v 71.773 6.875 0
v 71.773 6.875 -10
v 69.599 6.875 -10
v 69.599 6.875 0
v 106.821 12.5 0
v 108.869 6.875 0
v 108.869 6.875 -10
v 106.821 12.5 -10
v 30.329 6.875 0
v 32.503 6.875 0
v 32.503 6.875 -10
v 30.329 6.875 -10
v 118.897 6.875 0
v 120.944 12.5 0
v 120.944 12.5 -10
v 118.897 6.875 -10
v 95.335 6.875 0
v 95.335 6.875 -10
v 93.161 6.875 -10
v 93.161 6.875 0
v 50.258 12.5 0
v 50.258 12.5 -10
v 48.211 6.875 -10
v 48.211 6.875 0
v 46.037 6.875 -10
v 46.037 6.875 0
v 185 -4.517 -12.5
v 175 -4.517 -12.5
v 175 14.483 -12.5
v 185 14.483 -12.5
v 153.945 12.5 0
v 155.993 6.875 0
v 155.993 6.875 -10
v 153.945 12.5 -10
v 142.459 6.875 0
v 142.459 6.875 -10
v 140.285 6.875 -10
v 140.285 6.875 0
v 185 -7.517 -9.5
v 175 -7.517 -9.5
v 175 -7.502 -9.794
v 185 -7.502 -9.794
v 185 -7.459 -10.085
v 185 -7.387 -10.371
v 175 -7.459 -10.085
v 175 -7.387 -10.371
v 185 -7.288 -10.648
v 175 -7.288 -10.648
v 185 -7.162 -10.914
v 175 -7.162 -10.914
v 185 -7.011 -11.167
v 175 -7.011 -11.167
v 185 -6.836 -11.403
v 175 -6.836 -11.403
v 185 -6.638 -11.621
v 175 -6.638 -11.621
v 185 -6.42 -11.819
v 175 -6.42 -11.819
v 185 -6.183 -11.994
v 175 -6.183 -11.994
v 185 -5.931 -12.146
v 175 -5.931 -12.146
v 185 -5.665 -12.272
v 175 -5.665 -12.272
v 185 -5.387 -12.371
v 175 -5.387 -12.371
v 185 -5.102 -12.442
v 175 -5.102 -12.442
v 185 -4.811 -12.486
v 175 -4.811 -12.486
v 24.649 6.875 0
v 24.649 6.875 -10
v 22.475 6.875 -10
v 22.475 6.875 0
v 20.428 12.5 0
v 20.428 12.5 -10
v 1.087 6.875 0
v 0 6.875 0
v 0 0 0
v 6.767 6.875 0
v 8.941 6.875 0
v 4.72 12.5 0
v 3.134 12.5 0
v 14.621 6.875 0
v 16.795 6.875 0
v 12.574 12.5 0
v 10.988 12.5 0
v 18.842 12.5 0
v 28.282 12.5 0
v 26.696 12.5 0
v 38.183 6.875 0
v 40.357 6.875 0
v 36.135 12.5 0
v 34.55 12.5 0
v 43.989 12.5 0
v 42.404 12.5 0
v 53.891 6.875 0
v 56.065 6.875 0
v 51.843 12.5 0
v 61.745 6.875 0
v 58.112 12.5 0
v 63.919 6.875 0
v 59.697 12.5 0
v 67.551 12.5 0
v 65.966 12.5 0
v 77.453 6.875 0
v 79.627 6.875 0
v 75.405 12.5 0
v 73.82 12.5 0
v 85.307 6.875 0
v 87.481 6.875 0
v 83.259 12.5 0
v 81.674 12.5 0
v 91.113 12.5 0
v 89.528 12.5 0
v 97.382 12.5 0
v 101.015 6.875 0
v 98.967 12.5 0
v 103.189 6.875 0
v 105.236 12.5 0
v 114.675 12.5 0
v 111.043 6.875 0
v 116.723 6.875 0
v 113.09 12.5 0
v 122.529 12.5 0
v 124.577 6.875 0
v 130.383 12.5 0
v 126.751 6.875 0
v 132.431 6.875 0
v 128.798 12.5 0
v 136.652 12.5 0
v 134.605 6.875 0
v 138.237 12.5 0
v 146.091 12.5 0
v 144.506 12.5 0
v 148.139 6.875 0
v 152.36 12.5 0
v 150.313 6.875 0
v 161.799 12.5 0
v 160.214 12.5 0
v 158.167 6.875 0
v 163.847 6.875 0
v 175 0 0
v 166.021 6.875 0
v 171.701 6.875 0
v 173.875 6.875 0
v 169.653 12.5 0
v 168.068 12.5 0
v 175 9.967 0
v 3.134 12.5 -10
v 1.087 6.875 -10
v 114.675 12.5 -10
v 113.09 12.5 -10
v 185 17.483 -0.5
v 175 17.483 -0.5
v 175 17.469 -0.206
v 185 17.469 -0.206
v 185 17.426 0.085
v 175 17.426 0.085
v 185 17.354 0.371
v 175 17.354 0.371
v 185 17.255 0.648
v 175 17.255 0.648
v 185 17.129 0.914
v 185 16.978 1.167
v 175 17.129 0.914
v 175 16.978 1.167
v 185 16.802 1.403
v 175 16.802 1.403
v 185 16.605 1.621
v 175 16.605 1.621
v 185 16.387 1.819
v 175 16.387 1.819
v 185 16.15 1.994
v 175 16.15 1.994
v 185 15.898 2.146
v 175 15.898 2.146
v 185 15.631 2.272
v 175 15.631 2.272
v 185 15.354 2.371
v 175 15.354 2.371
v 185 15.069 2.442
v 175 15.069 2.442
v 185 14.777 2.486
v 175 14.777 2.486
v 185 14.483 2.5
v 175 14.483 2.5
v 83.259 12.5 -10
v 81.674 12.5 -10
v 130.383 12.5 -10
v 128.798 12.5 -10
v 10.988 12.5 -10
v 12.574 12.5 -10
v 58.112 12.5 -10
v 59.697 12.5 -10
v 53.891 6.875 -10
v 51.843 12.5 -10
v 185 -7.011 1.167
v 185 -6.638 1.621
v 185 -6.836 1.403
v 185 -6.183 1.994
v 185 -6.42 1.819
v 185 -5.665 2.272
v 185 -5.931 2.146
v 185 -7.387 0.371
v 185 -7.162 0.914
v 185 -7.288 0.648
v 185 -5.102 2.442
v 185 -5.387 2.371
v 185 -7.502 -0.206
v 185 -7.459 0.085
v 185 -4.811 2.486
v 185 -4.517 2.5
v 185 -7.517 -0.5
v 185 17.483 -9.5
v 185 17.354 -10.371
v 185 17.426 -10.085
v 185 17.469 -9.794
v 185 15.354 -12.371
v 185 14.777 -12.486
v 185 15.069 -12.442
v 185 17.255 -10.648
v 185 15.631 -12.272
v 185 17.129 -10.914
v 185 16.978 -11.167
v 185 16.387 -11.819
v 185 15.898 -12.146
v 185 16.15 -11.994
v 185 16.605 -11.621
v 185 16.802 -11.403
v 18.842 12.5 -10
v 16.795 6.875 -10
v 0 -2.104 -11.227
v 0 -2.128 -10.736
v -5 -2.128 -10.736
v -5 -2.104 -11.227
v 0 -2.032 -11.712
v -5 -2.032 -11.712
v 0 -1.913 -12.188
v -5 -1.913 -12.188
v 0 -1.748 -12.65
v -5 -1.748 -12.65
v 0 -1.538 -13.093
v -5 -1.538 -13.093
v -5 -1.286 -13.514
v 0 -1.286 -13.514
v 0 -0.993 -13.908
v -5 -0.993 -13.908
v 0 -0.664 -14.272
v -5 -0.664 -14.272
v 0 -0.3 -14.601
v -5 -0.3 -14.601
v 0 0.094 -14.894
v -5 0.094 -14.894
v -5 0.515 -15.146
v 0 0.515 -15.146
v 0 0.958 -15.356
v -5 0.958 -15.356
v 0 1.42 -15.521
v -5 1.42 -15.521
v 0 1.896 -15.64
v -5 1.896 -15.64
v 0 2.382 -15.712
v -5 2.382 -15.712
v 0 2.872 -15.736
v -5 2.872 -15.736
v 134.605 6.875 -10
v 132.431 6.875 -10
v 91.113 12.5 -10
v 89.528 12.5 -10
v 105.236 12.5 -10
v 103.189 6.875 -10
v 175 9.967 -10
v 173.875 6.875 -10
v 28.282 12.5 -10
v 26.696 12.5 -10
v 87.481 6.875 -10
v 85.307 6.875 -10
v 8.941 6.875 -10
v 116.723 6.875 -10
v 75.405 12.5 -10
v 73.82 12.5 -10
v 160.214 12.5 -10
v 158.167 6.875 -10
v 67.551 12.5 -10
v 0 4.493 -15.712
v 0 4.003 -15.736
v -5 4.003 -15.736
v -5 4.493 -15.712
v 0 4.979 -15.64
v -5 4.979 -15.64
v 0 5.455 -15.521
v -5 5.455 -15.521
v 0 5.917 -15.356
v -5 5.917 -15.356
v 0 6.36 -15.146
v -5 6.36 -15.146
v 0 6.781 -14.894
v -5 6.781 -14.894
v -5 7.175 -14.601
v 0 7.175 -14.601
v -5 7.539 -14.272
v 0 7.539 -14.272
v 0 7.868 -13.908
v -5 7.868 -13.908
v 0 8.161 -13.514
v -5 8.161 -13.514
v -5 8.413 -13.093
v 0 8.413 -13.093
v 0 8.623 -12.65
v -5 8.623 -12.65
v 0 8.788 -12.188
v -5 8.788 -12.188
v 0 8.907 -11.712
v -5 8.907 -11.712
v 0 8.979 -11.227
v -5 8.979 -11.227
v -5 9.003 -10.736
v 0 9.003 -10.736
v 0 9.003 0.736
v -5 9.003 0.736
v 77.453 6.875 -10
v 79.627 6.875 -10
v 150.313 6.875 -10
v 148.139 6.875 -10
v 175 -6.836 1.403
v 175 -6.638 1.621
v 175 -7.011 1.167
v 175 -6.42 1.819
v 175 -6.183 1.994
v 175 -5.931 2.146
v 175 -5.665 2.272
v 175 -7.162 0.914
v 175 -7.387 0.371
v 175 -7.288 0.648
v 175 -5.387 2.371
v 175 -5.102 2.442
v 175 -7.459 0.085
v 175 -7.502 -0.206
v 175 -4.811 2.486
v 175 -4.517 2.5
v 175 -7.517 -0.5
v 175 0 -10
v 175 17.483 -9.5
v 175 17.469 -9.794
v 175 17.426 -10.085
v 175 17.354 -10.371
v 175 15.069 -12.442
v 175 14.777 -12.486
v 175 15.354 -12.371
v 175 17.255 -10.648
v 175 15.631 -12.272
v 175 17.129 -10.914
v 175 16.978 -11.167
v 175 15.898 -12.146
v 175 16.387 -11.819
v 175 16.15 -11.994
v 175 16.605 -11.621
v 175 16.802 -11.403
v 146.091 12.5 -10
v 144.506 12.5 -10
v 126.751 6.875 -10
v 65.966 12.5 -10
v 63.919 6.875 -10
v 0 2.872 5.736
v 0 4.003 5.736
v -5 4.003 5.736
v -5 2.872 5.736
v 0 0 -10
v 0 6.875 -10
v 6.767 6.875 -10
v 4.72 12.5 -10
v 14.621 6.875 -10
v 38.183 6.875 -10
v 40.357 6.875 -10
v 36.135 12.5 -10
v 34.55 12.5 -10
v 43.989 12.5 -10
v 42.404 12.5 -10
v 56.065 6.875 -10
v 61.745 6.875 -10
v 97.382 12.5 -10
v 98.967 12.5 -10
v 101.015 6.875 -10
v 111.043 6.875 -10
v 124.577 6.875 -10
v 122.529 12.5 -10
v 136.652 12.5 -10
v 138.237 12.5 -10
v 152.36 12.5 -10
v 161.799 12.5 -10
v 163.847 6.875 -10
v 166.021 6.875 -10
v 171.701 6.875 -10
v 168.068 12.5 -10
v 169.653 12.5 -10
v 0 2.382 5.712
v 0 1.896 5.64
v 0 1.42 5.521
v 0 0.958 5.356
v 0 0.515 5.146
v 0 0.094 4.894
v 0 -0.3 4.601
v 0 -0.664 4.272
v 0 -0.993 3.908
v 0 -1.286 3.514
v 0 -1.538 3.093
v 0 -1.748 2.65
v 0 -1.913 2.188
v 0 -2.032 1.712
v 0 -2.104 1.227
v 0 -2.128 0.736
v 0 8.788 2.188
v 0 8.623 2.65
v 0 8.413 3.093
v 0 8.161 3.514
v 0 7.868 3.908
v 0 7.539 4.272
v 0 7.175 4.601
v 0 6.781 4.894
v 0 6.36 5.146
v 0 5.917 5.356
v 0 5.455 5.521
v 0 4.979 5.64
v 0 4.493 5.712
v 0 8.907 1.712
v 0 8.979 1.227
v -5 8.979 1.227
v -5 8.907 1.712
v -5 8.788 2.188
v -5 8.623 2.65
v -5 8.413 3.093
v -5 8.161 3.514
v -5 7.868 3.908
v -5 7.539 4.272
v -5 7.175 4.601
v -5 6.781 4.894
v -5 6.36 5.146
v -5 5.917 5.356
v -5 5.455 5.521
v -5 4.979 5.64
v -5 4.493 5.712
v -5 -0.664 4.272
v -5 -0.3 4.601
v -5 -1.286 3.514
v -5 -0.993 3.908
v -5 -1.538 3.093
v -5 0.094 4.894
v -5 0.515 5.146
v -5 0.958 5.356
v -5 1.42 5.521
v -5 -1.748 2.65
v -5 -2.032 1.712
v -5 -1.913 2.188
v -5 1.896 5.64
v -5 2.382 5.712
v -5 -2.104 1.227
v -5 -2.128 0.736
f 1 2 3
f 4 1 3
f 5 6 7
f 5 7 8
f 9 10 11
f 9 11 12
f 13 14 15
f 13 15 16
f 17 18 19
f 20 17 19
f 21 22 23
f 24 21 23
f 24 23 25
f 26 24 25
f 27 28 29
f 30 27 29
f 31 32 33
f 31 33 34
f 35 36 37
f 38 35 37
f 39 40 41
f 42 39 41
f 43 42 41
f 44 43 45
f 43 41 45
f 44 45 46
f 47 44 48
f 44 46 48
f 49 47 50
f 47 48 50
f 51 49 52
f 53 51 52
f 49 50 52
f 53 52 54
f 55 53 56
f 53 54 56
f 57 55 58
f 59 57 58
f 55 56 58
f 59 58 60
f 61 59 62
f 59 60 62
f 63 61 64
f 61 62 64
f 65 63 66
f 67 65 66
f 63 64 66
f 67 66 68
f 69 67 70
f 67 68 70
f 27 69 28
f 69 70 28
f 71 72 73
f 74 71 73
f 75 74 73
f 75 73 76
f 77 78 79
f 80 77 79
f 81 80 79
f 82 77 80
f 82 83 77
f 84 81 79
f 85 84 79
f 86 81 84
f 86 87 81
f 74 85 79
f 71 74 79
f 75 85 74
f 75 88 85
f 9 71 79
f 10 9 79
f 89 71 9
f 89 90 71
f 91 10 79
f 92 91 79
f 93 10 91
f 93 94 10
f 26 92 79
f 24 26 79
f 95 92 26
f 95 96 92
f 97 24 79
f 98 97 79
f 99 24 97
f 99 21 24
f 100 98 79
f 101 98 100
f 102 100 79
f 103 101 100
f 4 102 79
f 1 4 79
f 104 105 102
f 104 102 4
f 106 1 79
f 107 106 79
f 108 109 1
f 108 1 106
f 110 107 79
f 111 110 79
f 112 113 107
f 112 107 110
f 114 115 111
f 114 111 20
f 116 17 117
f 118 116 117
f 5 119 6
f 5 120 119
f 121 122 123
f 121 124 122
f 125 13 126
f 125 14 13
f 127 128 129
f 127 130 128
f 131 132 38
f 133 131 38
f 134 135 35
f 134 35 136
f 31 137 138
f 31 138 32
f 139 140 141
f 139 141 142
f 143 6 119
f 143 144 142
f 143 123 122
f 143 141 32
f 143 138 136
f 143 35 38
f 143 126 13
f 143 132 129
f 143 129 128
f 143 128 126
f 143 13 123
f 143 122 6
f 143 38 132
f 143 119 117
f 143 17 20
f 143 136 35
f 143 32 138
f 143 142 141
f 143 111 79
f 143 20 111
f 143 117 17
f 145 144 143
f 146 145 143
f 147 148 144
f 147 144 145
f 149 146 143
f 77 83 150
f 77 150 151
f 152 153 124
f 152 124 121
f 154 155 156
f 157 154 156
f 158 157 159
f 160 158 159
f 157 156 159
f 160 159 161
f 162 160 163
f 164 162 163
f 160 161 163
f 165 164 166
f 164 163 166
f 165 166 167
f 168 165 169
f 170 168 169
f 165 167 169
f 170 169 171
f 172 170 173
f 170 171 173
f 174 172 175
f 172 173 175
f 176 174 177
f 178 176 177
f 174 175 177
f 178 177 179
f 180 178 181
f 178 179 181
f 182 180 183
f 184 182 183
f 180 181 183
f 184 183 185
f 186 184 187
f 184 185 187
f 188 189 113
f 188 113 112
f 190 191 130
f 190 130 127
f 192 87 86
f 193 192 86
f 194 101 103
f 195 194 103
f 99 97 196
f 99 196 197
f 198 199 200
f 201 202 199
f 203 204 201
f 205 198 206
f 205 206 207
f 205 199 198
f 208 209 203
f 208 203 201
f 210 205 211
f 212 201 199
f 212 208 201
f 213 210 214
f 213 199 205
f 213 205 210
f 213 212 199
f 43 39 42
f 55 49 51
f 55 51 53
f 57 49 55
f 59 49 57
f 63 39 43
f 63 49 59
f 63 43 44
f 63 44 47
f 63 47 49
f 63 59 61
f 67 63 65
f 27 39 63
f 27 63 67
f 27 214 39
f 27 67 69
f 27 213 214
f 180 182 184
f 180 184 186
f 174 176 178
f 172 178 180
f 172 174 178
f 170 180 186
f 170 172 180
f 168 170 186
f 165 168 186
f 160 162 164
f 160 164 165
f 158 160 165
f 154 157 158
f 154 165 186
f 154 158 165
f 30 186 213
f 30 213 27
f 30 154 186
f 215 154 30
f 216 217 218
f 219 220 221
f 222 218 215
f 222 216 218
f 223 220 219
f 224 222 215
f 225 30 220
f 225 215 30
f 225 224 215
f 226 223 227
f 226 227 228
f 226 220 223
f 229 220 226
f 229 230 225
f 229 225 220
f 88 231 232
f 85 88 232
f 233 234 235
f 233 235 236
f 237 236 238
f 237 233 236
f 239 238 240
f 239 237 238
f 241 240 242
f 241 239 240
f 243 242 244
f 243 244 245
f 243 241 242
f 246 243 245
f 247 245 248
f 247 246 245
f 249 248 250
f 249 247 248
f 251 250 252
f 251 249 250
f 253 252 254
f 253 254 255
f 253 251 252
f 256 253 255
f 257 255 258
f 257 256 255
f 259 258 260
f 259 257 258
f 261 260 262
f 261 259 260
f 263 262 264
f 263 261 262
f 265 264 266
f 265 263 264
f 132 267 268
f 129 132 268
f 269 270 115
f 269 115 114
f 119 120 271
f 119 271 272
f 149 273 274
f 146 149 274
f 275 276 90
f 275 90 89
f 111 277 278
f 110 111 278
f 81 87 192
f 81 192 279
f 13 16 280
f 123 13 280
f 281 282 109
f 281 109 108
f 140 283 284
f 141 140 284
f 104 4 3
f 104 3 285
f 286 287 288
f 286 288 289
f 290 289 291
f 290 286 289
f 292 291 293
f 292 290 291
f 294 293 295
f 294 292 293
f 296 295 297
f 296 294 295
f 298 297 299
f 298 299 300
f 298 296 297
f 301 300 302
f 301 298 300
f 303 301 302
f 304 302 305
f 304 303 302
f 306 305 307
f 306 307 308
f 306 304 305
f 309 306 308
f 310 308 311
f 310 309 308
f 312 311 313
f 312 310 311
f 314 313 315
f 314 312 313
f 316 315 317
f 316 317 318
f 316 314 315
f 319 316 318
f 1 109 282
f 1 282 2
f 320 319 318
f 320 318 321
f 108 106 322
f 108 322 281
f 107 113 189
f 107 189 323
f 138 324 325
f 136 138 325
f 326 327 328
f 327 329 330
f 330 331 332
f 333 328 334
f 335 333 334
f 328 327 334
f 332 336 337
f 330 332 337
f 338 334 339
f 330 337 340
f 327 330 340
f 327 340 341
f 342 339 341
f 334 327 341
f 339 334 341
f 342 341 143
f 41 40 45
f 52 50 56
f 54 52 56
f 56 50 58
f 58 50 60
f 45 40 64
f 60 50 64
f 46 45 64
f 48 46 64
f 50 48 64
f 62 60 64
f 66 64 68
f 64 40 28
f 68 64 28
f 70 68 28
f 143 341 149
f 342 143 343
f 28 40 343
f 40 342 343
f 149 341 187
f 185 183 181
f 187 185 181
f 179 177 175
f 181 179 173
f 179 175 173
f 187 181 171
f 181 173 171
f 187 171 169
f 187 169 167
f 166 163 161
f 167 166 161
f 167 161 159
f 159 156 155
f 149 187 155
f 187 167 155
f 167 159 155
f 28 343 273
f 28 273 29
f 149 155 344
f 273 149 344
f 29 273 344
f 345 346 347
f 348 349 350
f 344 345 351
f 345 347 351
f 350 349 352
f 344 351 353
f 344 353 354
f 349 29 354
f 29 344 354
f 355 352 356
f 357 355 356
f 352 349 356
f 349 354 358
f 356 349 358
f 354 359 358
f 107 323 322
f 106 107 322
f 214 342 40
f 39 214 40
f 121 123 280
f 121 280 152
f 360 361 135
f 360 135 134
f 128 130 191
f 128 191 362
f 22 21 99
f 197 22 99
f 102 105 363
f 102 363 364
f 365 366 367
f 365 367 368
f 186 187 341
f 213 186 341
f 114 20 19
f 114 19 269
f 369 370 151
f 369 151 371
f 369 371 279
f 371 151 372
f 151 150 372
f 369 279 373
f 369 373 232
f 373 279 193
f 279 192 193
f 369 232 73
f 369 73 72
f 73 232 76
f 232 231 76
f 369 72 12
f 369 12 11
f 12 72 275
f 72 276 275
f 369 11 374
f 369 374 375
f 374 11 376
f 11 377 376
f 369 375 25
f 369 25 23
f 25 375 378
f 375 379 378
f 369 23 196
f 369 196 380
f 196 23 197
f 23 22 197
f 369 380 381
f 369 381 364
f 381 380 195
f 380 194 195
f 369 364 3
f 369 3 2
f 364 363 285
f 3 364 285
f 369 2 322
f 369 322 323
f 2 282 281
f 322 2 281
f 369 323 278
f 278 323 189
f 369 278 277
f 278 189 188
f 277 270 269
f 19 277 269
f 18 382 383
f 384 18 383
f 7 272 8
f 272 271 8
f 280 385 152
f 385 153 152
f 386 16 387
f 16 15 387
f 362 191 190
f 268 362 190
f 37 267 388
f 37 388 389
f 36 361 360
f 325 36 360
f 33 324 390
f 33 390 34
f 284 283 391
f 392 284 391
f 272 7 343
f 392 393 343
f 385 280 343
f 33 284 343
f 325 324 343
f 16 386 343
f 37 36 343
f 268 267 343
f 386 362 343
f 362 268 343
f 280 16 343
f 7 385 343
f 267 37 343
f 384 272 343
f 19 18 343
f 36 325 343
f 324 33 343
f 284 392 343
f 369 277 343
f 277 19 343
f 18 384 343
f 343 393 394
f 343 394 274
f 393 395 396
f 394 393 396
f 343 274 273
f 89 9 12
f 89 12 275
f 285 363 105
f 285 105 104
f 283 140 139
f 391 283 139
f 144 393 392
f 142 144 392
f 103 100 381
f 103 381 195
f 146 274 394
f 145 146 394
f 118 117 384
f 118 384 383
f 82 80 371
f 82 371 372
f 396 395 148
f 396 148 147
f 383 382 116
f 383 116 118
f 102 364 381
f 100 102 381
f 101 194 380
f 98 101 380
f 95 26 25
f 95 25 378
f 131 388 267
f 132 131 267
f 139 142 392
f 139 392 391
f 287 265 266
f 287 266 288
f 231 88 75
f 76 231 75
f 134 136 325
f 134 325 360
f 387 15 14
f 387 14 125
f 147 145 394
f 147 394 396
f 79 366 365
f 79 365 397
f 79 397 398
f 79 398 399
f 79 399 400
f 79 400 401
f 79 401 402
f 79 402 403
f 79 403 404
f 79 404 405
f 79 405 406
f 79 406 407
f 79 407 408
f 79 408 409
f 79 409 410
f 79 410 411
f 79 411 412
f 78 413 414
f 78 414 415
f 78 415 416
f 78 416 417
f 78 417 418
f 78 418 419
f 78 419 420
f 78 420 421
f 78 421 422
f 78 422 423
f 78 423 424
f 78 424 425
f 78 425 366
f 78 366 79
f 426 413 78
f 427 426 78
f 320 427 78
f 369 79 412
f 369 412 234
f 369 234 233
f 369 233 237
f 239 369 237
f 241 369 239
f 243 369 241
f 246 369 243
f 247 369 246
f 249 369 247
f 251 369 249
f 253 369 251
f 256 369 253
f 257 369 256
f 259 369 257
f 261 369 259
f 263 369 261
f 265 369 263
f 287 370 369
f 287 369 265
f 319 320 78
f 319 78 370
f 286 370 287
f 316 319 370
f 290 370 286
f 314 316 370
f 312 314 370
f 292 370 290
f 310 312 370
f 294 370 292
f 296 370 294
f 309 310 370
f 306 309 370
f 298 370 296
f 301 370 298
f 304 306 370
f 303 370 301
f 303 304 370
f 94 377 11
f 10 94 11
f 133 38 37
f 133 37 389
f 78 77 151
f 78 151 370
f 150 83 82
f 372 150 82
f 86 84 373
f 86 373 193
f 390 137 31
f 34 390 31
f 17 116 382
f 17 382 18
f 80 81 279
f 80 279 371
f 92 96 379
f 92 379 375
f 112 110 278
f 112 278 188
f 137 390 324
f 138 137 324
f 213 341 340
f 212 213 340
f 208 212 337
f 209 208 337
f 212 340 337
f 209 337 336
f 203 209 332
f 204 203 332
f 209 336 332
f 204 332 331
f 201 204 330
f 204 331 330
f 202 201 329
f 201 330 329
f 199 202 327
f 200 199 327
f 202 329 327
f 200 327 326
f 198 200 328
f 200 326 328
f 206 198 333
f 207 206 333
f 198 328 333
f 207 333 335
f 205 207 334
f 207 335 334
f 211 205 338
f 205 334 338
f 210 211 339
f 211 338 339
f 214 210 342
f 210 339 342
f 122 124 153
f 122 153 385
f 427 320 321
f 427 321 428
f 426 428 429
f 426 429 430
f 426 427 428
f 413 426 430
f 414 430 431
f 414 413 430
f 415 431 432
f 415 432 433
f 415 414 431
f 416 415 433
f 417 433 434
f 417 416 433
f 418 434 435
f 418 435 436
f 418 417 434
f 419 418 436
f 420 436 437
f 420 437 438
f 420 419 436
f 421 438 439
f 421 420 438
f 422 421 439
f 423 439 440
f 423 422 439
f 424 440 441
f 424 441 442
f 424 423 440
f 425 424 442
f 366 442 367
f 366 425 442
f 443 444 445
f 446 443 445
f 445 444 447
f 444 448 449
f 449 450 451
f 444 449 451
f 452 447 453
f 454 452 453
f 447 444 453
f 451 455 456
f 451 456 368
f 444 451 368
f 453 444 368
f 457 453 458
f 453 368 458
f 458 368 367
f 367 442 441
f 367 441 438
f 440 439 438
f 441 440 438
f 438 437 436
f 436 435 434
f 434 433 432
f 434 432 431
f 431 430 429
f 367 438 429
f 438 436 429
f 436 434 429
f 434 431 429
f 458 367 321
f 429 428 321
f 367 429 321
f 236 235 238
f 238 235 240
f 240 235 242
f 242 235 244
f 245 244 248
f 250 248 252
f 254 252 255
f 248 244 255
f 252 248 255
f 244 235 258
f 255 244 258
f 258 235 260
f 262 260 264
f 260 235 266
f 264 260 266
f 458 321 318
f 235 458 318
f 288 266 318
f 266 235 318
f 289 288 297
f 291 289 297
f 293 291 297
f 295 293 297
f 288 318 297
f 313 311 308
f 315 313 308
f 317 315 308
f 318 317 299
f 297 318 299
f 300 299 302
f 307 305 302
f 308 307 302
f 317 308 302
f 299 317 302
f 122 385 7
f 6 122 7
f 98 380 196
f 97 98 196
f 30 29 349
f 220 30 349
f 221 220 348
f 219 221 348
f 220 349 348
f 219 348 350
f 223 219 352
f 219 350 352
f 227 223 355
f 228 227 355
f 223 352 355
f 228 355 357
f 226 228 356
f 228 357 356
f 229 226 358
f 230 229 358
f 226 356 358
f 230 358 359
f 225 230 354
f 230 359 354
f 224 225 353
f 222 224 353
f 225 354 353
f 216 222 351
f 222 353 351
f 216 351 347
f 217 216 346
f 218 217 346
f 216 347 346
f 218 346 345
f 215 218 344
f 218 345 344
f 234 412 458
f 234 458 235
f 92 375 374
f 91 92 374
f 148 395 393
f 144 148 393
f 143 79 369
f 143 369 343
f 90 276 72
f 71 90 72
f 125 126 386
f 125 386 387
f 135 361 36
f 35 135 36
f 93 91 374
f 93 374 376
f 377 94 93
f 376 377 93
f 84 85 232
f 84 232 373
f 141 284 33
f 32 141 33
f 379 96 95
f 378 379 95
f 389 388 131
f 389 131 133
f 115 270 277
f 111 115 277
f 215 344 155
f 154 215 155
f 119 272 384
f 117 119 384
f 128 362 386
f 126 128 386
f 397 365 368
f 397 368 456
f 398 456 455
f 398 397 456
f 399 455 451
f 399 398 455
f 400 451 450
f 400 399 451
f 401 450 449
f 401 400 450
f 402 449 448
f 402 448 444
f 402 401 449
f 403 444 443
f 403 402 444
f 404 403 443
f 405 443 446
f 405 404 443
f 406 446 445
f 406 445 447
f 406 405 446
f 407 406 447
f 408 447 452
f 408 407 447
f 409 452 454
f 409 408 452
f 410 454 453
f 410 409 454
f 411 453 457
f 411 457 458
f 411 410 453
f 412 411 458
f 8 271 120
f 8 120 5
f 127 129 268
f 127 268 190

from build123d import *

# Parameters (mm, degrees)
BLANKSKE_W         = 175
BLANKSKE_H         = 12.5
BLANK_DEPTH        = 10
TOOTHCUTSIM_DEPTH  = 176.730617708
TEETHCUTS_COUNT    = 23
TEETHCUTS_PITCH    = 7.853981625
BOSS_EXTRU_1_DEPTH = 5
BOSS_EXTRU_2_DEPTH = 10


with BuildPart() as part:
    # BlankSke → Blank (new body)
    with BuildSketch(Plane.XY):
        with Locations((87.5, 6.25)):
            Rectangle(BLANKSKE_W, BLANKSKE_H)
    extrude(amount=-BLANK_DEPTH)

    # TooCutSkeSim → ToothCutSim (cut, through all)
    with BuildSketch(Plane.XY):
        Polygon((1.087088424, 6.875), (-1.087088424, 6.875), (-3.143665836, 12.5254), (3.143665836, 12.5254), align=None)
    toothcutsim = extrude(amount=-TOOTHCUTSIM_DEPTH, mode=Mode.SUBTRACT)

    # TeethCuts: ToothCutSim ×23
    with Locations(*[(i * TEETHCUTS_PITCH, 0, 0) for i in range(1, TEETHCUTS_COUNT)]):
        add(toothcutsim, mode=Mode.SUBTRACT)

    # Esquisse1 → Boss.-Extru.1 (add)
    with BuildSketch(Plane.ZY):
        with BuildLine():
            Line((-10.736438124, 9.003272752), (0.736438124, 9.003272752))
            ThreePointArc((0.736438124, 9.003272752), (4.27197203, 7.538806658), (5.736438124, 4.003272752))
            Line((5.736438124, 4.003272752), (5.736438124, 2.871727248))
            ThreePointArc((5.736438124, 2.871727248), (4.27197203, -0.663806658), (0.736438124, -2.128272752))
            Line((0.736438124, -2.128272752), (-10.736438124, -2.128272752))
            ThreePointArc((-10.736438124, -2.128272752), (-14.27197203, -0.663806658), (-15.736438124, 2.871727248))
            Line((-15.736438124, 2.871727248), (-15.736438124, 4.003272752))
            ThreePointArc((-15.736438124, 4.003272752), (-14.27197203, 7.538806658), (-10.736438124, 9.003272752))
        make_face()
    extrude(amount=BOSS_EXTRU_1_DEPTH)

    # Esquisse2 → Boss.-Extru.2 (add)
    with BuildSketch(Plane(origin=(175, 0, 0), x_dir=(0, 0, -1), z_dir=(1, 0, 0))):
        with BuildLine():
            Line((9.5, 17.483389911), (0.5, 17.483389911))
            ThreePointArc((0.5, 17.483389911), (-1.621320344, 16.604710254), (-2.5, 14.483389911))
            Line((-2.5, 14.483389911), (-2.5, -4.516610089))
            ThreePointArc((-2.5, -4.516610089), (-1.621320344, -6.637930433), (0.5, -7.516610089))
            Line((0.5, -7.516610089), (9.5, -7.516610089))
            ThreePointArc((9.5, -7.516610089), (11.621320344, -6.637930433), (12.5, -4.516610089))
            Line((12.5, -4.516610089), (12.5, 14.483389911))
            ThreePointArc((12.5, 14.483389911), (11.621320344, 16.604710254), (9.5, 17.483389911))
        make_face()
    extrude(amount=BOSS_EXTRU_2_DEPTH)


solid = part.part
